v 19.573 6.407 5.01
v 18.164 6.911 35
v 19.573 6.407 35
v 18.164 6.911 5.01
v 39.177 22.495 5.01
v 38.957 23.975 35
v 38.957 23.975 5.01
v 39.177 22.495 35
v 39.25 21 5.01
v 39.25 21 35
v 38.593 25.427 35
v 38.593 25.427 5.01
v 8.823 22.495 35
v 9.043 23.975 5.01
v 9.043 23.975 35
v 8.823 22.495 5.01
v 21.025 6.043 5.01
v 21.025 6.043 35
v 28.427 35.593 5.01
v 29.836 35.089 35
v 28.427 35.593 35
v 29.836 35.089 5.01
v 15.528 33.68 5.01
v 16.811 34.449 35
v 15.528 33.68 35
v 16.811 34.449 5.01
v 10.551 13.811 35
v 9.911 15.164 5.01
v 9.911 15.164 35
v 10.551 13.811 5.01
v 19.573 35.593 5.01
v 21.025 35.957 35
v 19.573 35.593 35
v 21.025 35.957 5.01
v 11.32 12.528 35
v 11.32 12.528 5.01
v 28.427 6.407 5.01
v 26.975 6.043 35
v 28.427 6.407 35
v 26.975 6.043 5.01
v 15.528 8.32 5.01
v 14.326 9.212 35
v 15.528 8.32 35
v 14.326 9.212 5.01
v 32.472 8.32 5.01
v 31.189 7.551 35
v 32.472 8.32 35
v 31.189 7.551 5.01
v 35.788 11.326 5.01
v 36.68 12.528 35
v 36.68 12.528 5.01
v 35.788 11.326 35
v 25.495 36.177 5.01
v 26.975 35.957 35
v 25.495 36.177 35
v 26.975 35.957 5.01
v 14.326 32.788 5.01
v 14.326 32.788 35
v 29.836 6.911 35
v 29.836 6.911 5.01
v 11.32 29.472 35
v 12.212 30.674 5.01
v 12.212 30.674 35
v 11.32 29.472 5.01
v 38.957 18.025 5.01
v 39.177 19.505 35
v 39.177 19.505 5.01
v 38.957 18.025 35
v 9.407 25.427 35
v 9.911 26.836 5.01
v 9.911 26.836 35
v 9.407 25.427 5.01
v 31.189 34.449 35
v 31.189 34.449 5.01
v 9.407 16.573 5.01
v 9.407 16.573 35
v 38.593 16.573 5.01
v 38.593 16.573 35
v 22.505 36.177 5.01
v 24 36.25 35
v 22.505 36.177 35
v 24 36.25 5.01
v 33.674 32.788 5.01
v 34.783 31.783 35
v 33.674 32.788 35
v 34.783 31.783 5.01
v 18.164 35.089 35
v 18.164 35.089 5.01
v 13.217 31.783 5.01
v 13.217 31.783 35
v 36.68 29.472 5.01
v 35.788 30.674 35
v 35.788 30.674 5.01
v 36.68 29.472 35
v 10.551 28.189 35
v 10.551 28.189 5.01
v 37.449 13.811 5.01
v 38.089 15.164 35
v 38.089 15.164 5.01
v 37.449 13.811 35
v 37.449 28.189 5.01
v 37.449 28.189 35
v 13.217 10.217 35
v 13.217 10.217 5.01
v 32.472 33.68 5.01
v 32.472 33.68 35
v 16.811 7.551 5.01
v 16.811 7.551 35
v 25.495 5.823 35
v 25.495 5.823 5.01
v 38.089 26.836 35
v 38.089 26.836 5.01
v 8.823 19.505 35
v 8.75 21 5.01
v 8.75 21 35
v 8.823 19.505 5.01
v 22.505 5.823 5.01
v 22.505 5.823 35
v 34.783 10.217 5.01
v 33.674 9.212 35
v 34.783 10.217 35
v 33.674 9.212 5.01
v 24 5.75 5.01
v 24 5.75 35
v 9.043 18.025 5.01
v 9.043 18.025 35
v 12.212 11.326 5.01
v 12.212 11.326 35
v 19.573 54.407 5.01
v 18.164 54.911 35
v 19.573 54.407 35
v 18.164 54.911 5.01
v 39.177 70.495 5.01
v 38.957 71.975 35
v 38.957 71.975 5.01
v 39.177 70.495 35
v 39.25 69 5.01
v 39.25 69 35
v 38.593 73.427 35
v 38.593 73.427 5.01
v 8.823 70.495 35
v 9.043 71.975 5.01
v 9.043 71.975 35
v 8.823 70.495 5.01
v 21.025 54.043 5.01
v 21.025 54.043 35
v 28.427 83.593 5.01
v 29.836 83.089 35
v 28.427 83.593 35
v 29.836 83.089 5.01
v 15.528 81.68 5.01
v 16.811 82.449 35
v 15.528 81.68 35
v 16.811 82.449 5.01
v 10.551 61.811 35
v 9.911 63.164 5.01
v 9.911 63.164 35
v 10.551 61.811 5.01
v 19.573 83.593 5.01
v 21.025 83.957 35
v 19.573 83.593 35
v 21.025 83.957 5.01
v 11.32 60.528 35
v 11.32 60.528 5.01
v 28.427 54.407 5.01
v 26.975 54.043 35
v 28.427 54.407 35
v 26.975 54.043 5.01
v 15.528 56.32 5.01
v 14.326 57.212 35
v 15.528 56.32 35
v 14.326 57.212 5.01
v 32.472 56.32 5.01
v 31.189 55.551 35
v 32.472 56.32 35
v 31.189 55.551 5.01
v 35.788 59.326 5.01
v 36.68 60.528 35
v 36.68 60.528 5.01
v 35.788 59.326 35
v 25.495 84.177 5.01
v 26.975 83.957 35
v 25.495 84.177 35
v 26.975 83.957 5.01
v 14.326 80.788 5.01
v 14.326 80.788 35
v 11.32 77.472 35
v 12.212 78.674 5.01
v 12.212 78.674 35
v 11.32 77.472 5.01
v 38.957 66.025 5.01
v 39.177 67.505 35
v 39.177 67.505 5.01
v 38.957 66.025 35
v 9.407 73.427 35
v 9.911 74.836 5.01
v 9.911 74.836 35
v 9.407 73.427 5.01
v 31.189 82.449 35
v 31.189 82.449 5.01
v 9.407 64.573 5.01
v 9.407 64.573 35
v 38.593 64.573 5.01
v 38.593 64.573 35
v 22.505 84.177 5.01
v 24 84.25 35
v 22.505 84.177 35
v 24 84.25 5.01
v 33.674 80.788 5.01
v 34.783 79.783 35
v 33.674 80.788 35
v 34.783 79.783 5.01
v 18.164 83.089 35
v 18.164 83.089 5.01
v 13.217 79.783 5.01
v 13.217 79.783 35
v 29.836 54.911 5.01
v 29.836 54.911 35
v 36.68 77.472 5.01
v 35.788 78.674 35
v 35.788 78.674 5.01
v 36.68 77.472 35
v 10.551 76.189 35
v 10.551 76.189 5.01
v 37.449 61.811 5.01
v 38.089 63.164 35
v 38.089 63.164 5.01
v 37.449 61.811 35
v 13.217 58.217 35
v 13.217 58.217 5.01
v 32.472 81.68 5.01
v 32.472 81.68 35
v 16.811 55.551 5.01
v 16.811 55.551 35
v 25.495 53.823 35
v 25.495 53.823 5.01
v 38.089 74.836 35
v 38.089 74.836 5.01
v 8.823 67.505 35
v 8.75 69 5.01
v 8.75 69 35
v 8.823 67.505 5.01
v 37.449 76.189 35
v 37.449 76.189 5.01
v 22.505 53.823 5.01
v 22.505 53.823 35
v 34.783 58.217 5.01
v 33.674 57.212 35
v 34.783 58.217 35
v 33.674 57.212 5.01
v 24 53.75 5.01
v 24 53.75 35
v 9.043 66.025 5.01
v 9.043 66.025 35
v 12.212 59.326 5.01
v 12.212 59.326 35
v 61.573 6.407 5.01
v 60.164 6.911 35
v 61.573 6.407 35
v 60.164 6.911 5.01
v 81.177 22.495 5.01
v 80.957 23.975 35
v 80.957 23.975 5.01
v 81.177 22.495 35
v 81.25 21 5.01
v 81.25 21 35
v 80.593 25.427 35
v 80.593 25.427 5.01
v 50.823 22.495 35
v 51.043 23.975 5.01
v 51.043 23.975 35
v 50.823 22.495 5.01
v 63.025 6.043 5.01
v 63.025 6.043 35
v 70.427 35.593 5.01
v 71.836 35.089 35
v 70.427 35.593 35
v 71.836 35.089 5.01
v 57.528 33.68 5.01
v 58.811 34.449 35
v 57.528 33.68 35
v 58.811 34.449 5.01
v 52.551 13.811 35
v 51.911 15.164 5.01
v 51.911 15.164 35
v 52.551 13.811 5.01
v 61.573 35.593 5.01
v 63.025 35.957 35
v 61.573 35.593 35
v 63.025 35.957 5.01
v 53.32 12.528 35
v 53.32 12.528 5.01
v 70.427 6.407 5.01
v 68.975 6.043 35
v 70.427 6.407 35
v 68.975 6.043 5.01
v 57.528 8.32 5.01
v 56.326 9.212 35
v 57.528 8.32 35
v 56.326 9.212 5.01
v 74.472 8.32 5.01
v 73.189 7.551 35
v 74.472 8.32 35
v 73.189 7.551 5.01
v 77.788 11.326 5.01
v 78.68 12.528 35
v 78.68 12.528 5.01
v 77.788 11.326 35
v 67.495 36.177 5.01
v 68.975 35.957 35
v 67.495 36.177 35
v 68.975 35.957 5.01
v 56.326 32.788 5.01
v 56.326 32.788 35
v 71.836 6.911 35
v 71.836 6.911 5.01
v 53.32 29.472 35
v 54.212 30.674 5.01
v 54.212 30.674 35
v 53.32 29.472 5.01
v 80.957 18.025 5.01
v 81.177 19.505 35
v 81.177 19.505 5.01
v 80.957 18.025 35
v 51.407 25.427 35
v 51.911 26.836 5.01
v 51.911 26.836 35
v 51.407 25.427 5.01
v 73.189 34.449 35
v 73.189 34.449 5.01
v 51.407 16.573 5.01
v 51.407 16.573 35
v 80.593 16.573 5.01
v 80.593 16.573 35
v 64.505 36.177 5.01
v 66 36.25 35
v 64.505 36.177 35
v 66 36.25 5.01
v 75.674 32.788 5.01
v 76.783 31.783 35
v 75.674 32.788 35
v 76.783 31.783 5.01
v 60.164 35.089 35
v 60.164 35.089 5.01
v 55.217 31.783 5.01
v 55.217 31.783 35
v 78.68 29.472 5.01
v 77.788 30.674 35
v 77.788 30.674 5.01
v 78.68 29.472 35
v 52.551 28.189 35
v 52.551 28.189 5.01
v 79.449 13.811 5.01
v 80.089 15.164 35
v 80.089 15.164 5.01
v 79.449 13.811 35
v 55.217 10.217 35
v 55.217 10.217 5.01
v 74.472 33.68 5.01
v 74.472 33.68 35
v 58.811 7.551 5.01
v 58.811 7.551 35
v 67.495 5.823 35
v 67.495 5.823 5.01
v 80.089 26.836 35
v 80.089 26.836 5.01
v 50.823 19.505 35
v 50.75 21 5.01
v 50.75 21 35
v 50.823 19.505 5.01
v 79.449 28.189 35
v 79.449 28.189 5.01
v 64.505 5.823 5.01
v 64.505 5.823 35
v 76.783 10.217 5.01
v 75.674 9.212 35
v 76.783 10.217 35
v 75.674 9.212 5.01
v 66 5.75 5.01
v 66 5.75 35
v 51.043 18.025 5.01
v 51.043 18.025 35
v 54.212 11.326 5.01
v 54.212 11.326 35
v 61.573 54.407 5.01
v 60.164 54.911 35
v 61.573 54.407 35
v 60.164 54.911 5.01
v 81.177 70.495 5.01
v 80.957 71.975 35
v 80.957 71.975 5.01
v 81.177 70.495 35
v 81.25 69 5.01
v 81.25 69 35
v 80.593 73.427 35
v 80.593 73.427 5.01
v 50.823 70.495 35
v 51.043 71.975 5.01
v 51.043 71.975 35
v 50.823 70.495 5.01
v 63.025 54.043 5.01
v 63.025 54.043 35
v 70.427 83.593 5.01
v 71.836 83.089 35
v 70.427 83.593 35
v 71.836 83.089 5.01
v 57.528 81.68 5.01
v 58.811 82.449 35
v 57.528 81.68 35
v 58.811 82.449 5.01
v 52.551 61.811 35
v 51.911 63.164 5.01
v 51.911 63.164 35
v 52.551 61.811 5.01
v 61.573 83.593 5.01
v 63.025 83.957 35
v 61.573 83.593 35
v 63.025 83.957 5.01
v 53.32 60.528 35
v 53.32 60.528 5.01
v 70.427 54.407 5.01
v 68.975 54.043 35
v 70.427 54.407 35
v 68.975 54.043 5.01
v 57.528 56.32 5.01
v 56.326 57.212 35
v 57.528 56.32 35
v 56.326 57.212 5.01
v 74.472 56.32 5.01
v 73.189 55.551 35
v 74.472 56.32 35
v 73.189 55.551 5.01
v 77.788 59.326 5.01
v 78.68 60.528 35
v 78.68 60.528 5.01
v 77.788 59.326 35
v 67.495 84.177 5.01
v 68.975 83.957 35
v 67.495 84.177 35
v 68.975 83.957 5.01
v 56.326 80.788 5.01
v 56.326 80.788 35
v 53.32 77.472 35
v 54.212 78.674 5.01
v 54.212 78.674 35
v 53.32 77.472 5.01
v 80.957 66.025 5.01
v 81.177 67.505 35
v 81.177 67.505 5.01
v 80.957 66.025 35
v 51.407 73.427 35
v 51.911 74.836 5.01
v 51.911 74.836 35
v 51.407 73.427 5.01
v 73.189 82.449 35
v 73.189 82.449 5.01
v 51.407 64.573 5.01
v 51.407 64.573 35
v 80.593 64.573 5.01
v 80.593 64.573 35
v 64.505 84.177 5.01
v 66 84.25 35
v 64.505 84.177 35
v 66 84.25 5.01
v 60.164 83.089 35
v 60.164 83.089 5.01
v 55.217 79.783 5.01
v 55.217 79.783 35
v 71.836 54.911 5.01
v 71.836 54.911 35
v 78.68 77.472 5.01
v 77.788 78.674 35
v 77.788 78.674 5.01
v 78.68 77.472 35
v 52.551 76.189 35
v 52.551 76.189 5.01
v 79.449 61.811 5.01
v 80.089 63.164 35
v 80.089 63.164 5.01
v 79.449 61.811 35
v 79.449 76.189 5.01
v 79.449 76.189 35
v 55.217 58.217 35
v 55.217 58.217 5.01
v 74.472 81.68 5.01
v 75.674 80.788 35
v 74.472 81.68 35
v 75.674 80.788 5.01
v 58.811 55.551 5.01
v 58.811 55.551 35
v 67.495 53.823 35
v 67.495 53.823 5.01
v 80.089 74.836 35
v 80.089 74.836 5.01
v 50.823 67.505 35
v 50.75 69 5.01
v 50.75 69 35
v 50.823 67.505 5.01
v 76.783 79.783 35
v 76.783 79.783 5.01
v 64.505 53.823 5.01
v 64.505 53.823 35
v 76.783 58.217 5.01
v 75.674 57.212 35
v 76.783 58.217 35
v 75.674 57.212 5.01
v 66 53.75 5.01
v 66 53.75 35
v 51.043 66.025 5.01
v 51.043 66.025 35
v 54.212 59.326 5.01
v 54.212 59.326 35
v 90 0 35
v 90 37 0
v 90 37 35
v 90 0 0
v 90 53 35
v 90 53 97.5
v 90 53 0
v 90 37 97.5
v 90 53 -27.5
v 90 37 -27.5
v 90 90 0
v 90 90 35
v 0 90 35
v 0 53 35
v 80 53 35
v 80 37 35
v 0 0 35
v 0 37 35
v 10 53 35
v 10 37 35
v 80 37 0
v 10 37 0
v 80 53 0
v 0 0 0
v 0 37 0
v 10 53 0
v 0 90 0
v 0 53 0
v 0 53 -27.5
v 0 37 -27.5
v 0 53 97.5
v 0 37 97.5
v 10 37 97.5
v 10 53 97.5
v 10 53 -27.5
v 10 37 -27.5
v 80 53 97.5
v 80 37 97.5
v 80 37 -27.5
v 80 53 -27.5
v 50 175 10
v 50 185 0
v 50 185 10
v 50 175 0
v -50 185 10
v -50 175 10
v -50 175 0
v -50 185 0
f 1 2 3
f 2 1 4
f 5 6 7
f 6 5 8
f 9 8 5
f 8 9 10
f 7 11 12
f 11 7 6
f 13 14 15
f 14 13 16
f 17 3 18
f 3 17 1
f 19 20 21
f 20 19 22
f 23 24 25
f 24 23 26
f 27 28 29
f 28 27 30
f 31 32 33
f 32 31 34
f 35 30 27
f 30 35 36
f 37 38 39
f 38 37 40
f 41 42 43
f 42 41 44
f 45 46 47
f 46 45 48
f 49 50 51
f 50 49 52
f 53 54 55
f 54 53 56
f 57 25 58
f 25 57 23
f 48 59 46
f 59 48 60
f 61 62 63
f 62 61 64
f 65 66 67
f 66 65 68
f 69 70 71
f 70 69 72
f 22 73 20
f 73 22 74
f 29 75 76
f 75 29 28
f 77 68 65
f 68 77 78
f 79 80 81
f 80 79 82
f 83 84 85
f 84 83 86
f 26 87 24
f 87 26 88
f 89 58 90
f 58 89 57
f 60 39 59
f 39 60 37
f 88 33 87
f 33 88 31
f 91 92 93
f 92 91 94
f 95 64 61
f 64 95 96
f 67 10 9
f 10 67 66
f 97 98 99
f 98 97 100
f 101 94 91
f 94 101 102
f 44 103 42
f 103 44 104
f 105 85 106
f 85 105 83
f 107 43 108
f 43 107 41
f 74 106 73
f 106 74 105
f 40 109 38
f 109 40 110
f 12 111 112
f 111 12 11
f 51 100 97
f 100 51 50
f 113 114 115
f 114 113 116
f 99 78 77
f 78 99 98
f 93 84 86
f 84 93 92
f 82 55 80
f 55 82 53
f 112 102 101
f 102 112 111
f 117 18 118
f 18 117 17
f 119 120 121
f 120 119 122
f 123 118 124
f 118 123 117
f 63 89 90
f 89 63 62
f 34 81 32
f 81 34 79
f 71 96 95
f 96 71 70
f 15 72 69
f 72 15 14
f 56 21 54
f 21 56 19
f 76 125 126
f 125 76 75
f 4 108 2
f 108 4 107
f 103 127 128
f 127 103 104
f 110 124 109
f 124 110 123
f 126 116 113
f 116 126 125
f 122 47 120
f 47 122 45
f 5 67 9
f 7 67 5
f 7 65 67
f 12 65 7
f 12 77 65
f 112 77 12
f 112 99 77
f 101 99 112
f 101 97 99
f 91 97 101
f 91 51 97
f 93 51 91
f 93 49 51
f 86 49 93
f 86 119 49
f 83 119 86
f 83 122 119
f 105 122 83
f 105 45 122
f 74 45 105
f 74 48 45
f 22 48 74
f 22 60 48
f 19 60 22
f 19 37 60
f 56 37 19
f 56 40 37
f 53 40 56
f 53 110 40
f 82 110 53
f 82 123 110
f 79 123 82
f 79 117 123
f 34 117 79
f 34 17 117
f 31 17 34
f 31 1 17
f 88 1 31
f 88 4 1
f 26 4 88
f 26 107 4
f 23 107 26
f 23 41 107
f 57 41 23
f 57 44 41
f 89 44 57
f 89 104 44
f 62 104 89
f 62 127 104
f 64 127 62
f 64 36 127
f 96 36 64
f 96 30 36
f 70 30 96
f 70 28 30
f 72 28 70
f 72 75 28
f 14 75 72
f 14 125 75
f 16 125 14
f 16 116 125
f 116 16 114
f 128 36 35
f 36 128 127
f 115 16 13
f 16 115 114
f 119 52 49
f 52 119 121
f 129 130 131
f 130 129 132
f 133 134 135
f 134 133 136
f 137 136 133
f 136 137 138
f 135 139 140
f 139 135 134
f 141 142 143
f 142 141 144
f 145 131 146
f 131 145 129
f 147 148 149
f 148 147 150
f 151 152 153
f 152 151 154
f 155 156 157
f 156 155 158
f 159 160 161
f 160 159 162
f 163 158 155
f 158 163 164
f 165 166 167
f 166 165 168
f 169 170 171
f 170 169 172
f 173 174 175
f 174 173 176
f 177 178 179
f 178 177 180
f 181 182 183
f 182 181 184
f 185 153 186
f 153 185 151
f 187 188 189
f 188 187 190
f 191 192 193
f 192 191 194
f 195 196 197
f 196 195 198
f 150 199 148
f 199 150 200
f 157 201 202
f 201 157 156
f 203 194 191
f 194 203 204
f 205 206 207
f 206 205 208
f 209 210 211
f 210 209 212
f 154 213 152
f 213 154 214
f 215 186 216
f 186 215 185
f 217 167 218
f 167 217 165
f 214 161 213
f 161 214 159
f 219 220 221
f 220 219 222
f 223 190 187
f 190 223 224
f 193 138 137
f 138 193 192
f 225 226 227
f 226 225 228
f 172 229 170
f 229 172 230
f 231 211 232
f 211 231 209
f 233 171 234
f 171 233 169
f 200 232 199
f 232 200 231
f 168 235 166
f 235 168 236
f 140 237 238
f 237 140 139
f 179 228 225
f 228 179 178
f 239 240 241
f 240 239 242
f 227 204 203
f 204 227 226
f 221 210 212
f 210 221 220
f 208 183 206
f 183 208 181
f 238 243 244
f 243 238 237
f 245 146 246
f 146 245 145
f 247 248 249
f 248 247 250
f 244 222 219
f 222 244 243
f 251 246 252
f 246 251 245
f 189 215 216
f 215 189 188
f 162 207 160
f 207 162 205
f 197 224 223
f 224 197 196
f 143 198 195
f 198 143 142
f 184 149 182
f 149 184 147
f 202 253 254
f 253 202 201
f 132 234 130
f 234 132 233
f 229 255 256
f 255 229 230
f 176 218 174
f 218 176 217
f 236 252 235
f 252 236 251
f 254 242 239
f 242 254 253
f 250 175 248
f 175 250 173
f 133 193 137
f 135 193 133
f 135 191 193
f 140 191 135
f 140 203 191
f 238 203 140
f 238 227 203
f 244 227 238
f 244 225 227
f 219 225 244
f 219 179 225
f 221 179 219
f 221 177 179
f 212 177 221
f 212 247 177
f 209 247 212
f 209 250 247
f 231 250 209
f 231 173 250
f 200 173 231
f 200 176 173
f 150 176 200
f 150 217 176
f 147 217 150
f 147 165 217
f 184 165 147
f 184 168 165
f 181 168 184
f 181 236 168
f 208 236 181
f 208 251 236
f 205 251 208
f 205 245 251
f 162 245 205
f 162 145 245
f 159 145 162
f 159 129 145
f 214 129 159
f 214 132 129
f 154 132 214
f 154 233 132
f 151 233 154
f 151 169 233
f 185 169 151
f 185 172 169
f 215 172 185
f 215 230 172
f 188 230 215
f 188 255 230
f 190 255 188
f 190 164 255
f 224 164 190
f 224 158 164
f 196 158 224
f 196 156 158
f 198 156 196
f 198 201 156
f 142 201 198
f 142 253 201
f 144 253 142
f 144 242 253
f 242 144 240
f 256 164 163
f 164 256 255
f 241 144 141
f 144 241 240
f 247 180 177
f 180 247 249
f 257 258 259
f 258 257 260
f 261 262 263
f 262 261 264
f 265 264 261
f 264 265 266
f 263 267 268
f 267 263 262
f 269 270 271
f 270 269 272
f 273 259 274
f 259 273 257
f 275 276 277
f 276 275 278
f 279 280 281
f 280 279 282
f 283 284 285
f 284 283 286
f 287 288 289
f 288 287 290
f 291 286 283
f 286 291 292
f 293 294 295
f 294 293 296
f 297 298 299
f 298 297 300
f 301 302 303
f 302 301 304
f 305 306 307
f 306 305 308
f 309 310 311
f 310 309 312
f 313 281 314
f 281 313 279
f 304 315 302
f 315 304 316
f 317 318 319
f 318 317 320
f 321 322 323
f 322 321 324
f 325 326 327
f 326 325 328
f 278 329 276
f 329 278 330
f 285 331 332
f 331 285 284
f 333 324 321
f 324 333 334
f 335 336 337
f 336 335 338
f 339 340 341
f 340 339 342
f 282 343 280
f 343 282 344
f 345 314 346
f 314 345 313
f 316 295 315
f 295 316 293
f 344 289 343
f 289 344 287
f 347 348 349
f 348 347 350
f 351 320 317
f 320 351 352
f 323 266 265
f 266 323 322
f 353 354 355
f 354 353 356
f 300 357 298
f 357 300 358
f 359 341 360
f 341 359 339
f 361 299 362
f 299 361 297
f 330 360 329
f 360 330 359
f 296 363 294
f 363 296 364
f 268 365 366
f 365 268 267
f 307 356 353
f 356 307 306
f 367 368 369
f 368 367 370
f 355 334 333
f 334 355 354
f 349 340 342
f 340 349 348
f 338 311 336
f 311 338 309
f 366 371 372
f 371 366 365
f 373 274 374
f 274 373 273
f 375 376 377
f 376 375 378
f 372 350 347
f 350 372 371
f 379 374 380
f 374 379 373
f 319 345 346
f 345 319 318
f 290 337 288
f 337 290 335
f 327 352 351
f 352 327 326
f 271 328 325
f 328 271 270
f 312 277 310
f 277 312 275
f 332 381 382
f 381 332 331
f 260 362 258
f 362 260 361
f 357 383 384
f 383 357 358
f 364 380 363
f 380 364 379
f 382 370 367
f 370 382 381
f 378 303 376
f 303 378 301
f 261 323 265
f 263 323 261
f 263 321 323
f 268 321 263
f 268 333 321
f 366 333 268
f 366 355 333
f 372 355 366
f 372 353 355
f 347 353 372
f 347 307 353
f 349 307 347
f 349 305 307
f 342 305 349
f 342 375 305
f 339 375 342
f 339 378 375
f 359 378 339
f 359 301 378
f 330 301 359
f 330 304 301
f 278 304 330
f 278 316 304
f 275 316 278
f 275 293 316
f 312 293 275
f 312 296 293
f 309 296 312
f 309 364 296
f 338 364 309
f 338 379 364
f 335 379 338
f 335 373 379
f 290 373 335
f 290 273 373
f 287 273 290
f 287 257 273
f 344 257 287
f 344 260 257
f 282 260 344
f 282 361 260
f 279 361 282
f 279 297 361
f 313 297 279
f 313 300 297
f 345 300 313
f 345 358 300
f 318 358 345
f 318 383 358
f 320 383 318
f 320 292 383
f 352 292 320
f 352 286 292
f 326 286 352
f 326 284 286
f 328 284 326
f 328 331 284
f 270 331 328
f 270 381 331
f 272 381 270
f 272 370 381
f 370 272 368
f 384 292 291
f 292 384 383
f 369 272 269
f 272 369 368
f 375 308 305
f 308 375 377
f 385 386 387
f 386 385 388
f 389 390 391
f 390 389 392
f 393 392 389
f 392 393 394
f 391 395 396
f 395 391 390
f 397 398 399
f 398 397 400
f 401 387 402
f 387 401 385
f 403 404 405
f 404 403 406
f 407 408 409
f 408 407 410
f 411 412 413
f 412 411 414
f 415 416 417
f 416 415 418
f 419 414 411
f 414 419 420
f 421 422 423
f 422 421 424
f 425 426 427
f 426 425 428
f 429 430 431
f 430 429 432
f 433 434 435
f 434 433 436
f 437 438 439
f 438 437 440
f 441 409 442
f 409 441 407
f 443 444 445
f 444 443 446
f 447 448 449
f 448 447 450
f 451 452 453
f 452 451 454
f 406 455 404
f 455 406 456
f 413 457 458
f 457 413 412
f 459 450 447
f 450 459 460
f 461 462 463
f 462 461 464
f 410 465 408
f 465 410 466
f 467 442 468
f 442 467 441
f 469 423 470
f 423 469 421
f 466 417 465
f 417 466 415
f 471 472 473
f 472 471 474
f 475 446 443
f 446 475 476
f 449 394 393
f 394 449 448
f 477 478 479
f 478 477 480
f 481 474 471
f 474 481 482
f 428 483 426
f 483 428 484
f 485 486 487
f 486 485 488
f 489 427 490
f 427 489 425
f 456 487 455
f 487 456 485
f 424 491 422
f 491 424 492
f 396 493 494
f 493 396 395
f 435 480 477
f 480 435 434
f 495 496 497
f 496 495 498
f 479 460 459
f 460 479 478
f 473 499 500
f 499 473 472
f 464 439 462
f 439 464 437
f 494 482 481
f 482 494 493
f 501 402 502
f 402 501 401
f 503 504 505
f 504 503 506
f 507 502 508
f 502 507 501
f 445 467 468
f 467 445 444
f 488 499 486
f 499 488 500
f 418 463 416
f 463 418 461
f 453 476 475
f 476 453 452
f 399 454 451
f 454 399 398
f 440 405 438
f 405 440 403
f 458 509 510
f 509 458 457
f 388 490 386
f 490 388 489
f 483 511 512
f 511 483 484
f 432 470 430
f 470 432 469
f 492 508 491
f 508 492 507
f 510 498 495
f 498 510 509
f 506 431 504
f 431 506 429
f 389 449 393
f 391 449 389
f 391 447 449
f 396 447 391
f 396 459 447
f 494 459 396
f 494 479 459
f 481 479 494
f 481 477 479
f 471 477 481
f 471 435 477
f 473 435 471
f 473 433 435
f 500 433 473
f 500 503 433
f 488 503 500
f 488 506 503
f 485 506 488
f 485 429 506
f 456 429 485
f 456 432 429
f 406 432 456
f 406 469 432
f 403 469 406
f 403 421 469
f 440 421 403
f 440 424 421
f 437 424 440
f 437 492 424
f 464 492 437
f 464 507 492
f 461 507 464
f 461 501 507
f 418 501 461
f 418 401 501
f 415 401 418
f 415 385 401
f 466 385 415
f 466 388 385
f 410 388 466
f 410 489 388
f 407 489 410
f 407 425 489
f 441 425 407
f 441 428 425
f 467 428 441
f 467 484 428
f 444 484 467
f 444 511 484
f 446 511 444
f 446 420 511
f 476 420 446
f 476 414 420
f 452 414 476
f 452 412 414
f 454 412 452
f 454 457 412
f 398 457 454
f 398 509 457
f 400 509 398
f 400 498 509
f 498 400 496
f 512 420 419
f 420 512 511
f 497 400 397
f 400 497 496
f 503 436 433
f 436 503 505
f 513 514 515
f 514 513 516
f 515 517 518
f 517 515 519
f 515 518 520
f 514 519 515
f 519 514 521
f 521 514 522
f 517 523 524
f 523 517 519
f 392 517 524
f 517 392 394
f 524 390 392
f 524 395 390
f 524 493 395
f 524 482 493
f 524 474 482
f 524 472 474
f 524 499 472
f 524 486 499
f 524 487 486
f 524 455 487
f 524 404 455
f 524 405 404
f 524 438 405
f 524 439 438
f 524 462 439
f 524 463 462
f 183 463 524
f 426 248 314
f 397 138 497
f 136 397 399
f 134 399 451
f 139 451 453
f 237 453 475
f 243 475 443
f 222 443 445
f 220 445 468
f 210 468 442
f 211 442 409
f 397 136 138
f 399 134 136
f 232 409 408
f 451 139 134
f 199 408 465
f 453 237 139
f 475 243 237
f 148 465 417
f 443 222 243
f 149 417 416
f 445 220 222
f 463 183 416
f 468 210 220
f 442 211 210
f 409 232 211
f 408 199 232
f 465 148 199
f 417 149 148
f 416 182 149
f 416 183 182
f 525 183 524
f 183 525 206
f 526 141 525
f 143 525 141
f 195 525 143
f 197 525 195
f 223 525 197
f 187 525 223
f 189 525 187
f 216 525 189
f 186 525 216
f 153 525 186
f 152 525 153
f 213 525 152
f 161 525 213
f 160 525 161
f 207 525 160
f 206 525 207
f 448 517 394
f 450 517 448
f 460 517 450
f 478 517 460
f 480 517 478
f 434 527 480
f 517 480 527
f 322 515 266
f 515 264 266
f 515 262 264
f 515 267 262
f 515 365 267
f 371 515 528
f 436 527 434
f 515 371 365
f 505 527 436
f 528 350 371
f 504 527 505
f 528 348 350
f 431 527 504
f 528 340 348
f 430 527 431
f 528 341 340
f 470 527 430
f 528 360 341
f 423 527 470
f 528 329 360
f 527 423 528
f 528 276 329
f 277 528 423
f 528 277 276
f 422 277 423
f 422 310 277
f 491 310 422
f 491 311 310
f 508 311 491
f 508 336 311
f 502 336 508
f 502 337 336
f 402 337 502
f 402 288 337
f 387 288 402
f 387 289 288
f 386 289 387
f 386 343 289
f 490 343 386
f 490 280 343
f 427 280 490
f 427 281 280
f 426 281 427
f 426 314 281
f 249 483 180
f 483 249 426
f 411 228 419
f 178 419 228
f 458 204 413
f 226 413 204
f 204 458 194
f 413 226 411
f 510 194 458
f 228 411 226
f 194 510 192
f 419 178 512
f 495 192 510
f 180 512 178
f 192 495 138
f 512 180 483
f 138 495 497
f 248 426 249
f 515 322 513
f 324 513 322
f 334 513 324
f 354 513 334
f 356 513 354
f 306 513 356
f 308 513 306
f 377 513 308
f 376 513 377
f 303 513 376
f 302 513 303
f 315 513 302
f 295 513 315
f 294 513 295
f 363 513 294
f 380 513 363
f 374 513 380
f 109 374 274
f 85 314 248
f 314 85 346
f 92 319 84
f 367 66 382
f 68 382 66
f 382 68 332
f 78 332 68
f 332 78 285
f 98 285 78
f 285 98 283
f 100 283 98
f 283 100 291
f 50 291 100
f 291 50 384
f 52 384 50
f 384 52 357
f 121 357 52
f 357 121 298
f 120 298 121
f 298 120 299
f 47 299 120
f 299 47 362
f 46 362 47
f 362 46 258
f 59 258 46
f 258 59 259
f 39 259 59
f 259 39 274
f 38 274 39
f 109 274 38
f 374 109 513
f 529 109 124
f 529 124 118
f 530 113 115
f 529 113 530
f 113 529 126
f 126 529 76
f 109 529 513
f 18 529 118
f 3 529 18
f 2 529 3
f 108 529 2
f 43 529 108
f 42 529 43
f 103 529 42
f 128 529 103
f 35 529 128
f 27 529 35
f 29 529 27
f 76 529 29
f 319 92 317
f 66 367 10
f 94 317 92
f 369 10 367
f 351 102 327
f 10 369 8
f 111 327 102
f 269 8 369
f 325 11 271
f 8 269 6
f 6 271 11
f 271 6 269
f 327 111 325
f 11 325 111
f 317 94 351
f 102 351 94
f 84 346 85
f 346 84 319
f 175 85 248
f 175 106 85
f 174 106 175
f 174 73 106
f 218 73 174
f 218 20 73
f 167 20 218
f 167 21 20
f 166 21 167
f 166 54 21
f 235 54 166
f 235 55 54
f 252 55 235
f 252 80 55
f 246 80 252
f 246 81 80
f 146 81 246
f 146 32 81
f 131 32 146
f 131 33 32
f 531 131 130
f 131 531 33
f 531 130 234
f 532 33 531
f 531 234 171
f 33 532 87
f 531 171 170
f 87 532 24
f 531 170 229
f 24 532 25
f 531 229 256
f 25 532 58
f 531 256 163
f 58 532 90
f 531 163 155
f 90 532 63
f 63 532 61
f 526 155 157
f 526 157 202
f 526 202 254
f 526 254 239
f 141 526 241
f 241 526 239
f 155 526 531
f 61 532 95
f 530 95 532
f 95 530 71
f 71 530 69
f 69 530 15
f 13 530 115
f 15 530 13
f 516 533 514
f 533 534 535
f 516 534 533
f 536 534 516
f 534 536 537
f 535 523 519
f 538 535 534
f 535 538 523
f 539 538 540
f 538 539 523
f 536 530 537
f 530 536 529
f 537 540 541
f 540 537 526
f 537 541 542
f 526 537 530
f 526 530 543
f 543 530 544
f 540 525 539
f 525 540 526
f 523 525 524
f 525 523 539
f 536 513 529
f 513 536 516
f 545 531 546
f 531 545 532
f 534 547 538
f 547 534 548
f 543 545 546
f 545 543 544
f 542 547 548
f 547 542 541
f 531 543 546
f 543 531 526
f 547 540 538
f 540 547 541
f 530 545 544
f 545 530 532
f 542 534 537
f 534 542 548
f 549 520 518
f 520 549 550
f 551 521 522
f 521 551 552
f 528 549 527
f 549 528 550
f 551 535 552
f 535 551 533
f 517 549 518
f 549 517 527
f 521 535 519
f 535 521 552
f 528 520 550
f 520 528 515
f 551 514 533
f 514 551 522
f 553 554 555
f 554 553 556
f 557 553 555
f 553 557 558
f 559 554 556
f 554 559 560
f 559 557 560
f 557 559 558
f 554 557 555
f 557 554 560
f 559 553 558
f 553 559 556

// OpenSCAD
// --- Parameters ---

// Part 1: Base Block Dimensions
base_width_x = 90;          // X dimension of base
base_depth_y = 90;          // Y dimension of base
base_height_z = 35;         // Z dimension of base

// Tube Seat Dimensions
seat_diameter = 30.5;       // Diameter of the conical tube seats
seat_depth = 30;            // Depth of the seats
seat_floor = 5;             // Remaining thickness at the bottom of seats
seat_x_pos = [-21, 21];     // X coordinates of the seats
seat_y_pos = [-24, 24];     // Y coordinates of the seats

// Post Dimensions
post_thickness_x = 10;      // Thickness of the posts along X
post_width_y = 16;          // Width of the posts along Y
post_top_z = 160;           // The top of the posts is at Z = 160
post_hole_z = 150;          // The center of the square hole is at Z = 150

// Hole Dimensions
hole_size = 10.4;           // Square hole size (X and Z)

// Part 2: Handle Dimensions
handle_width_x = 10;        // Width of the handle bar
handle_depth_y = 10;        // Depth of the handle bar
handle_length_z = 100;      // Length of the handle bar
handle_y_min = 55;          // Bottom Y position of the handle
handle_y_max = 65;          // Top Y position of the handle

// Rendering Quality
fn_val = 64;

// --- Part 1: Base and Posts ---

module part_1() {
    // The Base Block
    // Requirement: 90x90x35, rests on XY plane at z=0, centered on X and Y.
    // This means Z goes from 0 to 35.
    difference() {
        // Main block
        cube([base_width_x, base_depth_y, base_height_z], center = false);
        
        // The four blind seats
        // Seats are centered at X = +/- 21, Y = +/- 24.
        // They are 30mm deep. Since base is 35mm tall, they leave 5mm floor.
        // Top of base is at Z=35. Hole goes from Z=35 down to Z=5.
        for (i = [0:1]) {
            for (j = [0:1]) {
                // Translate to seat center. 
                // Since cube is not centered (0,0,0) but (45,45,0), 
                // we offset the seat centers by 45.
                translate([seat_x_pos[i] + 45, seat_y_pos[j] + 45, base_height_z - seat_depth + 0.01])
                    cylinder(h = seat_depth + 0.02, d = seat_diameter, center = false, $fn = fn_val);
            }
        }
    }

    // The Two Posts
    // Requirement: 10mm thick (X) and 16mm wide (Y).
    // Stand on the base at its two X ends, flush with end faces, centered on Y=0.
    // Base X ends are at 0 and 90.
    // Post 1 (Left): X from 0 to 10. Center X = 5.
    // Post 2 (Right): X from 80 to 90. Center X = 85.
    // Post Y: Centered on Y=0 means Y from -8 to 8.
    // Post Z: Rises to 160. Since it stands on the base, Z goes from 35 to 160.
    
    for (i = [0:1]) {
        // Calculate X center to be flush with ends (0 and 90)
        // If i=0, center is 5. If i=1, center is 85.
        x_center = (i == 0) ? 5 : 85;
        
        // Post is centered on Y=0. In our non-centered base, Y=0 is at coordinate 45.
        y_center = 45; 
        
        // Post height is 160 - 35 = 125.
        // Post Z goes from 35 to 160.
        translate([x_center, y_center, 35]) {
            difference() {
                // Post body
                cube([post_thickness_x, post_width_y, post_top_z - 35], center = true);
                
                // Square hole through the post along X
                // Hole is 10.4 x 10.4, centered at Z=150.
                // Since the post is translated to Z=35, the hole's local Z is 150 - 35 = 115.
                // We extend the hole in X to ensure it cuts through the post.
                translate([0, 0, 150 - 35])
                    cube([post_thickness_x + 2, hole_size, hole_size], center = true);
            }
        }
    }
}

// --- Part 2: Handle ---

module part_2() {
    // Requirement: Square bar 10x10, 100mm long, lying on the bed along X.
    // Centered on X=0. Spans Y=55 to 65.
    // "Lying on the bed" means Z goes from 0 to 10.
    // Centered on X=0 means X goes from -50 to 50.
    // Spans Y=55 to 65 means Y center is 60.
    
    translate([0, 60, 5])
        cube([100, 10, 10], center = true);
}

// --- Final Assembly (for visualization) ---

// Print Part 1
part_1();

// Print Part 2 (offset for visibility)
translate([0, 120, 0]) part_2();
